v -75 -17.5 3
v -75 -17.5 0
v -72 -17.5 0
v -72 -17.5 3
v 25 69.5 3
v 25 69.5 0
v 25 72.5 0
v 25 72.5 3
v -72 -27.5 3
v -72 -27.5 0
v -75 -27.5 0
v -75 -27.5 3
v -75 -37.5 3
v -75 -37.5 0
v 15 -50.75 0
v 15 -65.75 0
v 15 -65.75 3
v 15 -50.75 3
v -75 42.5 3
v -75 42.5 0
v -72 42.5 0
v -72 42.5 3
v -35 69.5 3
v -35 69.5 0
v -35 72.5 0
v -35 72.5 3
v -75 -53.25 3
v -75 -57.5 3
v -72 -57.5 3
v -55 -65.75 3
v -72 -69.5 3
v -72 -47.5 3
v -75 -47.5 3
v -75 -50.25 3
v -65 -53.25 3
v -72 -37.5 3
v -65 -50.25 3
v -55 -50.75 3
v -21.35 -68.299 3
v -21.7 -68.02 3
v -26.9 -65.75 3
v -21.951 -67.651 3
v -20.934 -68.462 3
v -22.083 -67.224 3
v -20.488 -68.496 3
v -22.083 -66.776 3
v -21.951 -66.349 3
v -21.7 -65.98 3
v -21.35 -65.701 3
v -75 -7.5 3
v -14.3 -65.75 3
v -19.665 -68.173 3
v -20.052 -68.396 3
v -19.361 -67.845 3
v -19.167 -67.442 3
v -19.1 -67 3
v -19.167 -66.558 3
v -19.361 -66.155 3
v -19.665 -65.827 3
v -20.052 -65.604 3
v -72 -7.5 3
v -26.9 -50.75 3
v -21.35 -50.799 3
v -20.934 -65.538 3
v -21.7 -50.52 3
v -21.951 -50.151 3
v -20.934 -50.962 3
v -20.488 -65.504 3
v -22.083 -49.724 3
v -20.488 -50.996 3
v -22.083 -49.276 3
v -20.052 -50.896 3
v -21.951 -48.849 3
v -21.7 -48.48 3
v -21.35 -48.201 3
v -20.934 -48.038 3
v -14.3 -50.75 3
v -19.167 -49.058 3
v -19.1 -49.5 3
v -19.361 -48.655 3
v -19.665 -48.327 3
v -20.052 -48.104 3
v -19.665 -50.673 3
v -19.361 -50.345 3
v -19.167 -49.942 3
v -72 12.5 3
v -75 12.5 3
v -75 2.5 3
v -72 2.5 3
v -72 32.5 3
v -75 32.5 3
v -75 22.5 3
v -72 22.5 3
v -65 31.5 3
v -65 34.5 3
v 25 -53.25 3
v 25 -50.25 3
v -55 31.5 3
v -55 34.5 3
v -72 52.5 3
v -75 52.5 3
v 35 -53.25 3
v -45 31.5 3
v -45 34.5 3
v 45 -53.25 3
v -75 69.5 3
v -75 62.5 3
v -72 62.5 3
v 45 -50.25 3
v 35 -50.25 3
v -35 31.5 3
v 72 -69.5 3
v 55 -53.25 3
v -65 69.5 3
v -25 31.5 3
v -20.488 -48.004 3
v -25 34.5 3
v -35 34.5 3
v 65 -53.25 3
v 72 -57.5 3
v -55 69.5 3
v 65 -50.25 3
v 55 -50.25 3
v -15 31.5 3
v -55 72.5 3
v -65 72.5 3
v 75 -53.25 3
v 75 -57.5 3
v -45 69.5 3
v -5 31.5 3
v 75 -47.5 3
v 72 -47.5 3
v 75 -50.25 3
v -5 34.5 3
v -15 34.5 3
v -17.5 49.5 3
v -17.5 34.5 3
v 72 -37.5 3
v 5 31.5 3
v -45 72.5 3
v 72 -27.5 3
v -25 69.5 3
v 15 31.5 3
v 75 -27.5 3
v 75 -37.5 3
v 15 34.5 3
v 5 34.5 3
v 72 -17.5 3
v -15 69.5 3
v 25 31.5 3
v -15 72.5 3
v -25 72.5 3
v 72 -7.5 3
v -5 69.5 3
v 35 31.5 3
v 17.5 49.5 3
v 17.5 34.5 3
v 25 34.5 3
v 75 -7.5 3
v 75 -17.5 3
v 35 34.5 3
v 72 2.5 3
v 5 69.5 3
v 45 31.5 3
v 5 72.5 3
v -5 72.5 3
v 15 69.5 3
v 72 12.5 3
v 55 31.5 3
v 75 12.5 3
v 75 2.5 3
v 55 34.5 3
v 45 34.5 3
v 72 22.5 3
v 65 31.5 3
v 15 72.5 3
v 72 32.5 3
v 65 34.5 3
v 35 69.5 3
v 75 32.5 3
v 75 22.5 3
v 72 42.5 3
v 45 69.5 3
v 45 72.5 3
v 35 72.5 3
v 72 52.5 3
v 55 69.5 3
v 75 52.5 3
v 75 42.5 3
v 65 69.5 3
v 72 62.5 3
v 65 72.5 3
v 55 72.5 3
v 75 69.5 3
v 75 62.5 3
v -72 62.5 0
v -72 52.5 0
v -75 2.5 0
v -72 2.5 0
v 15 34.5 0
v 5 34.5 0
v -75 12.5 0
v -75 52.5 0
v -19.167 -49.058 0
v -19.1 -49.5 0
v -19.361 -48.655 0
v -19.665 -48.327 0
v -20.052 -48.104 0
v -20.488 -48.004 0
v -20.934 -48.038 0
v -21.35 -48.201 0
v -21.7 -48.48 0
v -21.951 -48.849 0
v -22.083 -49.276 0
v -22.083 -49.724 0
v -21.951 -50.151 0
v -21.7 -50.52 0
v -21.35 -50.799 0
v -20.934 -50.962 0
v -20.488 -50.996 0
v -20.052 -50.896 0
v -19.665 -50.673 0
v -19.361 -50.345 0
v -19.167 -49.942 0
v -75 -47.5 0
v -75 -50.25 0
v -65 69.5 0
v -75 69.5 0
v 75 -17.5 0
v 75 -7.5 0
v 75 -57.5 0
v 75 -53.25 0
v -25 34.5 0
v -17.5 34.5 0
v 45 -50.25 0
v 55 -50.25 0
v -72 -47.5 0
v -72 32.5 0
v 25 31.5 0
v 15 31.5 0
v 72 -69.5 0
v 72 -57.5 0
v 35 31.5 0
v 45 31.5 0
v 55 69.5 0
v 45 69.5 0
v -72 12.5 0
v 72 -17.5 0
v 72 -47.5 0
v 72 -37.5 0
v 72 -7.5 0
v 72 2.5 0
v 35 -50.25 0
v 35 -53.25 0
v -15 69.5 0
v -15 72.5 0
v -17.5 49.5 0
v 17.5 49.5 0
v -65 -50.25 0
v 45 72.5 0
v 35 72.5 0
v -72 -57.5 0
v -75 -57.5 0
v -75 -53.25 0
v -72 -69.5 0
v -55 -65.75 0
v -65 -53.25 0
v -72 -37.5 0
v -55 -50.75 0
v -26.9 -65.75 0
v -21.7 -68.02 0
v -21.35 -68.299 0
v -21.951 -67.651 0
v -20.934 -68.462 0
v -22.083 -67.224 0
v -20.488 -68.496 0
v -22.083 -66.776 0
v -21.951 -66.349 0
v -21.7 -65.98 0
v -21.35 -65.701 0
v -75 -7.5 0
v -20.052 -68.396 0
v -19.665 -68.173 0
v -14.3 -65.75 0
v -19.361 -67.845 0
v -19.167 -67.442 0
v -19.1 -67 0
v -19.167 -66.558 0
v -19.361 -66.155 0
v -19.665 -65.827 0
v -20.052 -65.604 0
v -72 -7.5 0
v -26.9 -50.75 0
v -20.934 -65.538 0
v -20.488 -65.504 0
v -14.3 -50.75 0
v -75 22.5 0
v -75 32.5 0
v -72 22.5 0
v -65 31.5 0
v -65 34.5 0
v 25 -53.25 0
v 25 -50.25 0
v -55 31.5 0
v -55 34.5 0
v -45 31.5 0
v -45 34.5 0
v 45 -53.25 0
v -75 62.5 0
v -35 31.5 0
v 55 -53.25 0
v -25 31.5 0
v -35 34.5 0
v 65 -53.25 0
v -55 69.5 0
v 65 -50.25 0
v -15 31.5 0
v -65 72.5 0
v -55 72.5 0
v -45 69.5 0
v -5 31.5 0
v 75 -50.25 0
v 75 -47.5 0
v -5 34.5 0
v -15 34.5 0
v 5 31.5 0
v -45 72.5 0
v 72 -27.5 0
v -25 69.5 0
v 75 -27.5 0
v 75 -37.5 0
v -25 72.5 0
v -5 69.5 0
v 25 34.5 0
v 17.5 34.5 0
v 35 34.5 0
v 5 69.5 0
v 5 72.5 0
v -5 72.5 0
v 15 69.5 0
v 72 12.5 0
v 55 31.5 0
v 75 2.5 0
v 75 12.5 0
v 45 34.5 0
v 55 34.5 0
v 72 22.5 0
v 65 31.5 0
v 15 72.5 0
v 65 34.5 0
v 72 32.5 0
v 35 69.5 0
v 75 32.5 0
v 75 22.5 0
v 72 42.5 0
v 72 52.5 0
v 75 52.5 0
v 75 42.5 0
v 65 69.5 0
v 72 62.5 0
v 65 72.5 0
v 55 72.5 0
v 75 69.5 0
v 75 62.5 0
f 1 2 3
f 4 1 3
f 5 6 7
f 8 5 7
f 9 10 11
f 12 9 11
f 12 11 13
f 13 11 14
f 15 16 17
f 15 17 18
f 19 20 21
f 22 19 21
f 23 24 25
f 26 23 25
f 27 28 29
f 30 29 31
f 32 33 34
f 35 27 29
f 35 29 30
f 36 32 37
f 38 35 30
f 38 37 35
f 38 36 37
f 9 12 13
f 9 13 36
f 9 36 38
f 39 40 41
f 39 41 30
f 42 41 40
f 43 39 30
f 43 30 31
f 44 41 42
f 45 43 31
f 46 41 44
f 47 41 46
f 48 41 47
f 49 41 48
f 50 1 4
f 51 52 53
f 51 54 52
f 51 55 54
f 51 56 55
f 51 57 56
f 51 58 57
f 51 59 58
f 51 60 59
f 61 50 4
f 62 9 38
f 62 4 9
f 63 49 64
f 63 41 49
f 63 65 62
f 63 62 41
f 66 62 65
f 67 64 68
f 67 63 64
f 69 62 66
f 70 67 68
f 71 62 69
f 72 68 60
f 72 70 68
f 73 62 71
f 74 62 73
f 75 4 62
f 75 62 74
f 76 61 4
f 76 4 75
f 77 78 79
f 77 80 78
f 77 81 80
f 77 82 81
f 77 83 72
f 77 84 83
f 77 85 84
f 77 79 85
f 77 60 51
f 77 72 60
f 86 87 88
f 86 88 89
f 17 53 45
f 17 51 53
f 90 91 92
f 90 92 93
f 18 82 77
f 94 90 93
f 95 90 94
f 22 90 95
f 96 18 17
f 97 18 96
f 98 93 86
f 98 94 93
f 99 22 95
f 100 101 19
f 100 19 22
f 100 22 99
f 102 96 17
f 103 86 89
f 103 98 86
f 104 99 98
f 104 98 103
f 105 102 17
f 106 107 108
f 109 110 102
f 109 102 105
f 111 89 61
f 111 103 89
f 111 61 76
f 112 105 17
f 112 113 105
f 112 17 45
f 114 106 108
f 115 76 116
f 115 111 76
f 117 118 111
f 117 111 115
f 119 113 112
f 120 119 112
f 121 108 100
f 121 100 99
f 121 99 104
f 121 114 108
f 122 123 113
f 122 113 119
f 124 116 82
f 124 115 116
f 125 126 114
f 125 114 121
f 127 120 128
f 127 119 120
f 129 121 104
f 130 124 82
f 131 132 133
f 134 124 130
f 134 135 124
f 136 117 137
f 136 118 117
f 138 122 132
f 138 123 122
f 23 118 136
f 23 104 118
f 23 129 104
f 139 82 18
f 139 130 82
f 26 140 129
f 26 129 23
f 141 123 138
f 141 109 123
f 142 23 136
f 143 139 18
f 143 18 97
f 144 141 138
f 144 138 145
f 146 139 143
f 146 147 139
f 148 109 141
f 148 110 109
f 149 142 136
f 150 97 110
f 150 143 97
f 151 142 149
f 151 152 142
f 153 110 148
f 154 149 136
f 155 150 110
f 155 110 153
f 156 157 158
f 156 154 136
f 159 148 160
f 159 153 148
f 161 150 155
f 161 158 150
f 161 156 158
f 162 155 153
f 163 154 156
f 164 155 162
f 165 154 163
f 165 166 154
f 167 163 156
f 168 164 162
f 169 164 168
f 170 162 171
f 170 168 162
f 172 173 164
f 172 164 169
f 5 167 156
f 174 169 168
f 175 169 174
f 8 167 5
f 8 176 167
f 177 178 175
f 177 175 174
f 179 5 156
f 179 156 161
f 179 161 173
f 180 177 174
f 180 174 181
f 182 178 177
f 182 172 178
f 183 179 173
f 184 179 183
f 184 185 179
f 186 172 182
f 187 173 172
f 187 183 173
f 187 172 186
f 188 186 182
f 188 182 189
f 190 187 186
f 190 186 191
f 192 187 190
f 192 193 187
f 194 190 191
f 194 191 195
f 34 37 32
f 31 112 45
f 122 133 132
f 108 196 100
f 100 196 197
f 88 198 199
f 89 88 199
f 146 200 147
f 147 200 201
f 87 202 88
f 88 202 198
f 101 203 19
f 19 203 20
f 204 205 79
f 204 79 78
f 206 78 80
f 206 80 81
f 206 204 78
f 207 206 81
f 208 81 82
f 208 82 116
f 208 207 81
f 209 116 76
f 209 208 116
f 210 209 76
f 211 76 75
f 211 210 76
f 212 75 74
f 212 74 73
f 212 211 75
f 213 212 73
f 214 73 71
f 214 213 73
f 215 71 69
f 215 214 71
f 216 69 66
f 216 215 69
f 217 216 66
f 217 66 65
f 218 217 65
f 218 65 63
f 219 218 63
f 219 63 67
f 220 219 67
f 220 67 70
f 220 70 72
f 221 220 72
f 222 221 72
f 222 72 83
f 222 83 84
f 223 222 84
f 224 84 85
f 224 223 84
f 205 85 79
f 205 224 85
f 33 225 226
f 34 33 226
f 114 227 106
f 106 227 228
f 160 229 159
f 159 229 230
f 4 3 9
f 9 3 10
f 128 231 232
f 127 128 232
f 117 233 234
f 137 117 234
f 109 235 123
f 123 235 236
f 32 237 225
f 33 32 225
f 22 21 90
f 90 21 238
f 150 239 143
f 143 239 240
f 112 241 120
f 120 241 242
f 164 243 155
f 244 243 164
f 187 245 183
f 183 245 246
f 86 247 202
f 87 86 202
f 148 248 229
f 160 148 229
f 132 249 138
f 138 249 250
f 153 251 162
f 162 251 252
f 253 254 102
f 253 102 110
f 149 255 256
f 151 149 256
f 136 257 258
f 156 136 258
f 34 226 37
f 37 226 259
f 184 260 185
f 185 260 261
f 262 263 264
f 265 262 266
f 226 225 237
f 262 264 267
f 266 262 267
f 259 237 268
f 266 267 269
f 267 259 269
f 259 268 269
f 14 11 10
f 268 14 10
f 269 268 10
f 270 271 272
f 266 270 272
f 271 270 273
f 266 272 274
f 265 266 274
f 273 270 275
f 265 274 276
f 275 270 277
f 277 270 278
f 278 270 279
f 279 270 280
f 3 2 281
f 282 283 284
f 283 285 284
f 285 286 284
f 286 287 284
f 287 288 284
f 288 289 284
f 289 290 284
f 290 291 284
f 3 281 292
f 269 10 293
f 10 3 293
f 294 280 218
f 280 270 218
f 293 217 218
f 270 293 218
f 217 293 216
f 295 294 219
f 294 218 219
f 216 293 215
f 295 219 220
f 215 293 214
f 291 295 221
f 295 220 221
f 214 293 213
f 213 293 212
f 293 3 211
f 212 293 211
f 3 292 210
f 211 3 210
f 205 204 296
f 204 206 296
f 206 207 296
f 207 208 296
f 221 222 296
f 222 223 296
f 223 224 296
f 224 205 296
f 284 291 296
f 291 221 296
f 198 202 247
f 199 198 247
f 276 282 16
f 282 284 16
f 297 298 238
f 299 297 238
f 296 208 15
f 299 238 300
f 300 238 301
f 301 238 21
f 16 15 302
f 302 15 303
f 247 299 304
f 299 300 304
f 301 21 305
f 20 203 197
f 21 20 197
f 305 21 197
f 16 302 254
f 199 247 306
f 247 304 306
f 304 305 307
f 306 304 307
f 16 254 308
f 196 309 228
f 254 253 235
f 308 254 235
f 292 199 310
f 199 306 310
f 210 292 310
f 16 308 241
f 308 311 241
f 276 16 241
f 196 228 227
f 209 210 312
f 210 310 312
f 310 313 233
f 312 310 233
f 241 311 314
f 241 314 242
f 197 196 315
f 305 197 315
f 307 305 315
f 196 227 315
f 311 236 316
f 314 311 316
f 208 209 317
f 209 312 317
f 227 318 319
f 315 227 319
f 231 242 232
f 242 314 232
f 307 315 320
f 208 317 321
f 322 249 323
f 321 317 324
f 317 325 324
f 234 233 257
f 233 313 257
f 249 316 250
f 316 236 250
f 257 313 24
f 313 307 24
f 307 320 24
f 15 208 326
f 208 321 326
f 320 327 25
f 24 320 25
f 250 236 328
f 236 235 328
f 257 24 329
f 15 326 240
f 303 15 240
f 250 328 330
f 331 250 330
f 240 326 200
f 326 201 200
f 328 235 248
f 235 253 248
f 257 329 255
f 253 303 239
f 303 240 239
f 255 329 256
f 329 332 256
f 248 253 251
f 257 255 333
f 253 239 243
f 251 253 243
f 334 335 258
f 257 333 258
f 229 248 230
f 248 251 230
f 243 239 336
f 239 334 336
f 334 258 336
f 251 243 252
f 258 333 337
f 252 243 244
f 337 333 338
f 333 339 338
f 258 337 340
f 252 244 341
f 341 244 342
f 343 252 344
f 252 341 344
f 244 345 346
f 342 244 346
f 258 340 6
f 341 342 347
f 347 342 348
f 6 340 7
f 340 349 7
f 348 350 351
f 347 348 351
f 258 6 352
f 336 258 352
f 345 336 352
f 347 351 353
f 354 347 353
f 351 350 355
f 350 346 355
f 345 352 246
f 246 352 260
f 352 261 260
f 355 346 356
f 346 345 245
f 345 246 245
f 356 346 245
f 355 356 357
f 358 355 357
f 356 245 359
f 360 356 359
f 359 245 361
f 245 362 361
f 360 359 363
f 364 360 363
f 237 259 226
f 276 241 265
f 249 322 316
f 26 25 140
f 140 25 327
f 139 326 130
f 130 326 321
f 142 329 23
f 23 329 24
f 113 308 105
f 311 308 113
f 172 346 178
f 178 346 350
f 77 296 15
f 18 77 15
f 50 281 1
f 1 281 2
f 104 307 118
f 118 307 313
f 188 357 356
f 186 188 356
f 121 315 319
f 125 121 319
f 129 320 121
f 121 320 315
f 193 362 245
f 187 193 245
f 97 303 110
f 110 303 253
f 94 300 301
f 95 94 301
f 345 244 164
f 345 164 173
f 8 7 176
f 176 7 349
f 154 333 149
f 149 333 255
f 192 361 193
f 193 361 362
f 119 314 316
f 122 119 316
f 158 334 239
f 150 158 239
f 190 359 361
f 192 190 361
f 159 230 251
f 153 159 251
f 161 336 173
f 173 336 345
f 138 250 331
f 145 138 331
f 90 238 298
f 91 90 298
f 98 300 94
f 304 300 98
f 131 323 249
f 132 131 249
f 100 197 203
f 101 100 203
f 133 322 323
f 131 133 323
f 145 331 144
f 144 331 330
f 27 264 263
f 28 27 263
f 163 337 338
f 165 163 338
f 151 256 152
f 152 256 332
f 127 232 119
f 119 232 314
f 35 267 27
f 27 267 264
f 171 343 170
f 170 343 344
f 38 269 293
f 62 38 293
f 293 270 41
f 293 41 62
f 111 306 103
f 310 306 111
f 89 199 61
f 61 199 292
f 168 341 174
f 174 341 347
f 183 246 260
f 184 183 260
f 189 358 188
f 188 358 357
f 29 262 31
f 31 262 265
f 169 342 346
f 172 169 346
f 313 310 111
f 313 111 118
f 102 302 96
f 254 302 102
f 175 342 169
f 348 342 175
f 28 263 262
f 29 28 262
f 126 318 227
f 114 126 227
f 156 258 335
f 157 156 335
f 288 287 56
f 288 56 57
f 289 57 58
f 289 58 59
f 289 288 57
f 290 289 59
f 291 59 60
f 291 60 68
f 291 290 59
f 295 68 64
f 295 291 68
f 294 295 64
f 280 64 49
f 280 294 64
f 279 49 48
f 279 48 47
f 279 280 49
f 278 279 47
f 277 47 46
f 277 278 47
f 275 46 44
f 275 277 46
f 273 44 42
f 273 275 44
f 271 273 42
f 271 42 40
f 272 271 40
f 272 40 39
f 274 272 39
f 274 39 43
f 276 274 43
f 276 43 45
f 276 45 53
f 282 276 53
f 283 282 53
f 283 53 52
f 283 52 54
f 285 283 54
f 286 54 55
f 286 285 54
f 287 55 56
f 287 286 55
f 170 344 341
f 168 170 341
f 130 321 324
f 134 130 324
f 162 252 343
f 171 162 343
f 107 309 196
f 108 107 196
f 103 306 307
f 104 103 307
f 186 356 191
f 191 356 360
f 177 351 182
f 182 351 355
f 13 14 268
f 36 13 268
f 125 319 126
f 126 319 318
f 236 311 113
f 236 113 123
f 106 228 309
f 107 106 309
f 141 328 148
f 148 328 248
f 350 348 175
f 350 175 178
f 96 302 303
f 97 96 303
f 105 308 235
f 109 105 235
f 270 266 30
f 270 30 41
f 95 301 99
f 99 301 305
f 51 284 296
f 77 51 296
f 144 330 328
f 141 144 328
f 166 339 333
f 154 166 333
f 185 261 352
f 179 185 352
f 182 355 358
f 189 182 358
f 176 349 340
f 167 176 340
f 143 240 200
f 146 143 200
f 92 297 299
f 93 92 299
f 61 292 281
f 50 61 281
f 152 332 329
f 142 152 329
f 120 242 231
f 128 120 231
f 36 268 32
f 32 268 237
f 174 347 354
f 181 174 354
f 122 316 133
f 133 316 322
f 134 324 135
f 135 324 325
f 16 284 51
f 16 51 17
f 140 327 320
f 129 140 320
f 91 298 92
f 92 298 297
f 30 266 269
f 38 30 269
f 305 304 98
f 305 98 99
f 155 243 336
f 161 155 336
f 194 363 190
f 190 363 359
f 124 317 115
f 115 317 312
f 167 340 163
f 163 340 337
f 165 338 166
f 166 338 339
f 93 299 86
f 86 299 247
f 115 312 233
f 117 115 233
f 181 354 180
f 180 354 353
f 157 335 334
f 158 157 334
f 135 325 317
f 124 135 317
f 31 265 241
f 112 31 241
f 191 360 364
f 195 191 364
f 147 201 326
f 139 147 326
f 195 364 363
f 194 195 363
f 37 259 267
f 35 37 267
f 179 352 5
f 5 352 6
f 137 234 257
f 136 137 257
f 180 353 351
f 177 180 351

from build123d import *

# Parameters (mm, degrees)
CROQUIS1_W              = 10
CROQUIS1_H              = 3
CROQUIS1_W_2            = 28.1
CROQUIS1_H_2            = 15
CROQUIS1_R              = 1.5
CROQUIS1_W_3            = 29.3
SALIENTE_EXTRUIR3_DEPTH = 3


with BuildPart() as part:
    # Croquis1 → Saliente-Extruir3 (new body)
    with BuildSketch(Plane.XY):
        Polygon((-35, 72.5), (-45, 72.5), (-45, 69.5), (-55, 69.5), (-55, 72.5), (-65, 72.5), (-65, 69.5), (-75, 69.5), (-75, 62.5), (-72, 62.5), (-72, 52.5), (-75, 52.5), (-75, 42.5), (-72, 42.5), (-72, 32.5), (-75, 32.5), (-75, 22.5), (-72, 22.5), (-72, 12.5), (-75, 12.5), (-75, 2.5), (-72, 2.5), (-72, -7.5), (-75, -7.5), (-75, -17.5), (-72, -17.5), (-72, -27.5), (-75, -27.5), (-75, -37.5), (-72, -37.5), (-72, -47.5), (-75, -47.5), (-75, -50.25), (-65, -50.25), (-65, -53.25), (-75, -53.25), (-75, -57.5), (-72, -57.5), (-72, -69.5), (72, -69.5), (72, -57.5), (75, -57.5), (75, -53.25), (65, -53.25), (65, -50.25), (75, -50.25), (75, -47.5), (72, -47.5), (72, -37.5), (75, -37.5), (75, -27.5), (72, -27.5), (72, -17.5), (75, -17.5), (75, -7.5), (72, -7.5), (72, 2.5), (75, 2.5), (75, 12.5), (72, 12.5), (72, 22.5), (75, 22.5), (75, 32.5), (72, 32.5), (72, 42.5), (75, 42.5), (75, 52.5), (72, 52.5), (72, 62.5), (75, 62.5), (75, 69.5), (65, 69.5), (65, 72.5), (55, 72.5), (55, 69.5), (45, 69.5), (45, 72.5), (35, 72.5), (35, 69.5), (25, 69.5), (25, 72.5), (15, 72.5), (15, 69.5), (5, 69.5), (5, 72.5), (-5, 72.5), (-5, 69.5), (-15, 69.5), (-15, 72.5), (-25, 72.5), (-25, 69.5), (-35, 69.5), align=None)
        with Locations((60, 33)):
            Rectangle(CROQUIS1_W, CROQUIS1_H, mode=Mode.SUBTRACT)
        with Locations((-40.95, -58.25)):
            Rectangle(CROQUIS1_W_2, CROQUIS1_H_2, mode=Mode.SUBTRACT)
        with Locations((-20.6, -67)):
            Circle(CROQUIS1_R, mode=Mode.SUBTRACT)
        with Locations((-20.6, -49.5)):
            Circle(CROQUIS1_R, mode=Mode.SUBTRACT)
        with Locations((0.35, -58.25)):
            Rectangle(CROQUIS1_W_3, CROQUIS1_H_2, mode=Mode.SUBTRACT)
        with Locations((30, -51.75)):
            Rectangle(CROQUIS1_W, CROQUIS1_H, mode=Mode.SUBTRACT)
        with Locations((50, -51.75)):
            Rectangle(CROQUIS1_W, CROQUIS1_H, mode=Mode.SUBTRACT)
        with Locations((-60, 33)):
            Rectangle(CROQUIS1_W, CROQUIS1_H, mode=Mode.SUBTRACT)
        with Locations((-40, 33)):
            Rectangle(CROQUIS1_W, CROQUIS1_H, mode=Mode.SUBTRACT)
        Polygon((-25, 31.5), (-25, 34.5), (-17.5, 34.5), (-17.5, 49.5), (17.5, 49.5), (17.5, 34.5), (25, 34.5), (25, 31.5), (15, 31.5), (15, 34.5), (5, 34.5), (5, 31.5), (-5, 31.5), (-5, 34.5), (-15, 34.5), (-15, 31.5), align=None, mode=Mode.SUBTRACT)
        with Locations((40, 33)):
            Rectangle(CROQUIS1_W, CROQUIS1_H, mode=Mode.SUBTRACT)
    extrude(amount=SALIENTE_EXTRUIR3_DEPTH)


solid = part.part
